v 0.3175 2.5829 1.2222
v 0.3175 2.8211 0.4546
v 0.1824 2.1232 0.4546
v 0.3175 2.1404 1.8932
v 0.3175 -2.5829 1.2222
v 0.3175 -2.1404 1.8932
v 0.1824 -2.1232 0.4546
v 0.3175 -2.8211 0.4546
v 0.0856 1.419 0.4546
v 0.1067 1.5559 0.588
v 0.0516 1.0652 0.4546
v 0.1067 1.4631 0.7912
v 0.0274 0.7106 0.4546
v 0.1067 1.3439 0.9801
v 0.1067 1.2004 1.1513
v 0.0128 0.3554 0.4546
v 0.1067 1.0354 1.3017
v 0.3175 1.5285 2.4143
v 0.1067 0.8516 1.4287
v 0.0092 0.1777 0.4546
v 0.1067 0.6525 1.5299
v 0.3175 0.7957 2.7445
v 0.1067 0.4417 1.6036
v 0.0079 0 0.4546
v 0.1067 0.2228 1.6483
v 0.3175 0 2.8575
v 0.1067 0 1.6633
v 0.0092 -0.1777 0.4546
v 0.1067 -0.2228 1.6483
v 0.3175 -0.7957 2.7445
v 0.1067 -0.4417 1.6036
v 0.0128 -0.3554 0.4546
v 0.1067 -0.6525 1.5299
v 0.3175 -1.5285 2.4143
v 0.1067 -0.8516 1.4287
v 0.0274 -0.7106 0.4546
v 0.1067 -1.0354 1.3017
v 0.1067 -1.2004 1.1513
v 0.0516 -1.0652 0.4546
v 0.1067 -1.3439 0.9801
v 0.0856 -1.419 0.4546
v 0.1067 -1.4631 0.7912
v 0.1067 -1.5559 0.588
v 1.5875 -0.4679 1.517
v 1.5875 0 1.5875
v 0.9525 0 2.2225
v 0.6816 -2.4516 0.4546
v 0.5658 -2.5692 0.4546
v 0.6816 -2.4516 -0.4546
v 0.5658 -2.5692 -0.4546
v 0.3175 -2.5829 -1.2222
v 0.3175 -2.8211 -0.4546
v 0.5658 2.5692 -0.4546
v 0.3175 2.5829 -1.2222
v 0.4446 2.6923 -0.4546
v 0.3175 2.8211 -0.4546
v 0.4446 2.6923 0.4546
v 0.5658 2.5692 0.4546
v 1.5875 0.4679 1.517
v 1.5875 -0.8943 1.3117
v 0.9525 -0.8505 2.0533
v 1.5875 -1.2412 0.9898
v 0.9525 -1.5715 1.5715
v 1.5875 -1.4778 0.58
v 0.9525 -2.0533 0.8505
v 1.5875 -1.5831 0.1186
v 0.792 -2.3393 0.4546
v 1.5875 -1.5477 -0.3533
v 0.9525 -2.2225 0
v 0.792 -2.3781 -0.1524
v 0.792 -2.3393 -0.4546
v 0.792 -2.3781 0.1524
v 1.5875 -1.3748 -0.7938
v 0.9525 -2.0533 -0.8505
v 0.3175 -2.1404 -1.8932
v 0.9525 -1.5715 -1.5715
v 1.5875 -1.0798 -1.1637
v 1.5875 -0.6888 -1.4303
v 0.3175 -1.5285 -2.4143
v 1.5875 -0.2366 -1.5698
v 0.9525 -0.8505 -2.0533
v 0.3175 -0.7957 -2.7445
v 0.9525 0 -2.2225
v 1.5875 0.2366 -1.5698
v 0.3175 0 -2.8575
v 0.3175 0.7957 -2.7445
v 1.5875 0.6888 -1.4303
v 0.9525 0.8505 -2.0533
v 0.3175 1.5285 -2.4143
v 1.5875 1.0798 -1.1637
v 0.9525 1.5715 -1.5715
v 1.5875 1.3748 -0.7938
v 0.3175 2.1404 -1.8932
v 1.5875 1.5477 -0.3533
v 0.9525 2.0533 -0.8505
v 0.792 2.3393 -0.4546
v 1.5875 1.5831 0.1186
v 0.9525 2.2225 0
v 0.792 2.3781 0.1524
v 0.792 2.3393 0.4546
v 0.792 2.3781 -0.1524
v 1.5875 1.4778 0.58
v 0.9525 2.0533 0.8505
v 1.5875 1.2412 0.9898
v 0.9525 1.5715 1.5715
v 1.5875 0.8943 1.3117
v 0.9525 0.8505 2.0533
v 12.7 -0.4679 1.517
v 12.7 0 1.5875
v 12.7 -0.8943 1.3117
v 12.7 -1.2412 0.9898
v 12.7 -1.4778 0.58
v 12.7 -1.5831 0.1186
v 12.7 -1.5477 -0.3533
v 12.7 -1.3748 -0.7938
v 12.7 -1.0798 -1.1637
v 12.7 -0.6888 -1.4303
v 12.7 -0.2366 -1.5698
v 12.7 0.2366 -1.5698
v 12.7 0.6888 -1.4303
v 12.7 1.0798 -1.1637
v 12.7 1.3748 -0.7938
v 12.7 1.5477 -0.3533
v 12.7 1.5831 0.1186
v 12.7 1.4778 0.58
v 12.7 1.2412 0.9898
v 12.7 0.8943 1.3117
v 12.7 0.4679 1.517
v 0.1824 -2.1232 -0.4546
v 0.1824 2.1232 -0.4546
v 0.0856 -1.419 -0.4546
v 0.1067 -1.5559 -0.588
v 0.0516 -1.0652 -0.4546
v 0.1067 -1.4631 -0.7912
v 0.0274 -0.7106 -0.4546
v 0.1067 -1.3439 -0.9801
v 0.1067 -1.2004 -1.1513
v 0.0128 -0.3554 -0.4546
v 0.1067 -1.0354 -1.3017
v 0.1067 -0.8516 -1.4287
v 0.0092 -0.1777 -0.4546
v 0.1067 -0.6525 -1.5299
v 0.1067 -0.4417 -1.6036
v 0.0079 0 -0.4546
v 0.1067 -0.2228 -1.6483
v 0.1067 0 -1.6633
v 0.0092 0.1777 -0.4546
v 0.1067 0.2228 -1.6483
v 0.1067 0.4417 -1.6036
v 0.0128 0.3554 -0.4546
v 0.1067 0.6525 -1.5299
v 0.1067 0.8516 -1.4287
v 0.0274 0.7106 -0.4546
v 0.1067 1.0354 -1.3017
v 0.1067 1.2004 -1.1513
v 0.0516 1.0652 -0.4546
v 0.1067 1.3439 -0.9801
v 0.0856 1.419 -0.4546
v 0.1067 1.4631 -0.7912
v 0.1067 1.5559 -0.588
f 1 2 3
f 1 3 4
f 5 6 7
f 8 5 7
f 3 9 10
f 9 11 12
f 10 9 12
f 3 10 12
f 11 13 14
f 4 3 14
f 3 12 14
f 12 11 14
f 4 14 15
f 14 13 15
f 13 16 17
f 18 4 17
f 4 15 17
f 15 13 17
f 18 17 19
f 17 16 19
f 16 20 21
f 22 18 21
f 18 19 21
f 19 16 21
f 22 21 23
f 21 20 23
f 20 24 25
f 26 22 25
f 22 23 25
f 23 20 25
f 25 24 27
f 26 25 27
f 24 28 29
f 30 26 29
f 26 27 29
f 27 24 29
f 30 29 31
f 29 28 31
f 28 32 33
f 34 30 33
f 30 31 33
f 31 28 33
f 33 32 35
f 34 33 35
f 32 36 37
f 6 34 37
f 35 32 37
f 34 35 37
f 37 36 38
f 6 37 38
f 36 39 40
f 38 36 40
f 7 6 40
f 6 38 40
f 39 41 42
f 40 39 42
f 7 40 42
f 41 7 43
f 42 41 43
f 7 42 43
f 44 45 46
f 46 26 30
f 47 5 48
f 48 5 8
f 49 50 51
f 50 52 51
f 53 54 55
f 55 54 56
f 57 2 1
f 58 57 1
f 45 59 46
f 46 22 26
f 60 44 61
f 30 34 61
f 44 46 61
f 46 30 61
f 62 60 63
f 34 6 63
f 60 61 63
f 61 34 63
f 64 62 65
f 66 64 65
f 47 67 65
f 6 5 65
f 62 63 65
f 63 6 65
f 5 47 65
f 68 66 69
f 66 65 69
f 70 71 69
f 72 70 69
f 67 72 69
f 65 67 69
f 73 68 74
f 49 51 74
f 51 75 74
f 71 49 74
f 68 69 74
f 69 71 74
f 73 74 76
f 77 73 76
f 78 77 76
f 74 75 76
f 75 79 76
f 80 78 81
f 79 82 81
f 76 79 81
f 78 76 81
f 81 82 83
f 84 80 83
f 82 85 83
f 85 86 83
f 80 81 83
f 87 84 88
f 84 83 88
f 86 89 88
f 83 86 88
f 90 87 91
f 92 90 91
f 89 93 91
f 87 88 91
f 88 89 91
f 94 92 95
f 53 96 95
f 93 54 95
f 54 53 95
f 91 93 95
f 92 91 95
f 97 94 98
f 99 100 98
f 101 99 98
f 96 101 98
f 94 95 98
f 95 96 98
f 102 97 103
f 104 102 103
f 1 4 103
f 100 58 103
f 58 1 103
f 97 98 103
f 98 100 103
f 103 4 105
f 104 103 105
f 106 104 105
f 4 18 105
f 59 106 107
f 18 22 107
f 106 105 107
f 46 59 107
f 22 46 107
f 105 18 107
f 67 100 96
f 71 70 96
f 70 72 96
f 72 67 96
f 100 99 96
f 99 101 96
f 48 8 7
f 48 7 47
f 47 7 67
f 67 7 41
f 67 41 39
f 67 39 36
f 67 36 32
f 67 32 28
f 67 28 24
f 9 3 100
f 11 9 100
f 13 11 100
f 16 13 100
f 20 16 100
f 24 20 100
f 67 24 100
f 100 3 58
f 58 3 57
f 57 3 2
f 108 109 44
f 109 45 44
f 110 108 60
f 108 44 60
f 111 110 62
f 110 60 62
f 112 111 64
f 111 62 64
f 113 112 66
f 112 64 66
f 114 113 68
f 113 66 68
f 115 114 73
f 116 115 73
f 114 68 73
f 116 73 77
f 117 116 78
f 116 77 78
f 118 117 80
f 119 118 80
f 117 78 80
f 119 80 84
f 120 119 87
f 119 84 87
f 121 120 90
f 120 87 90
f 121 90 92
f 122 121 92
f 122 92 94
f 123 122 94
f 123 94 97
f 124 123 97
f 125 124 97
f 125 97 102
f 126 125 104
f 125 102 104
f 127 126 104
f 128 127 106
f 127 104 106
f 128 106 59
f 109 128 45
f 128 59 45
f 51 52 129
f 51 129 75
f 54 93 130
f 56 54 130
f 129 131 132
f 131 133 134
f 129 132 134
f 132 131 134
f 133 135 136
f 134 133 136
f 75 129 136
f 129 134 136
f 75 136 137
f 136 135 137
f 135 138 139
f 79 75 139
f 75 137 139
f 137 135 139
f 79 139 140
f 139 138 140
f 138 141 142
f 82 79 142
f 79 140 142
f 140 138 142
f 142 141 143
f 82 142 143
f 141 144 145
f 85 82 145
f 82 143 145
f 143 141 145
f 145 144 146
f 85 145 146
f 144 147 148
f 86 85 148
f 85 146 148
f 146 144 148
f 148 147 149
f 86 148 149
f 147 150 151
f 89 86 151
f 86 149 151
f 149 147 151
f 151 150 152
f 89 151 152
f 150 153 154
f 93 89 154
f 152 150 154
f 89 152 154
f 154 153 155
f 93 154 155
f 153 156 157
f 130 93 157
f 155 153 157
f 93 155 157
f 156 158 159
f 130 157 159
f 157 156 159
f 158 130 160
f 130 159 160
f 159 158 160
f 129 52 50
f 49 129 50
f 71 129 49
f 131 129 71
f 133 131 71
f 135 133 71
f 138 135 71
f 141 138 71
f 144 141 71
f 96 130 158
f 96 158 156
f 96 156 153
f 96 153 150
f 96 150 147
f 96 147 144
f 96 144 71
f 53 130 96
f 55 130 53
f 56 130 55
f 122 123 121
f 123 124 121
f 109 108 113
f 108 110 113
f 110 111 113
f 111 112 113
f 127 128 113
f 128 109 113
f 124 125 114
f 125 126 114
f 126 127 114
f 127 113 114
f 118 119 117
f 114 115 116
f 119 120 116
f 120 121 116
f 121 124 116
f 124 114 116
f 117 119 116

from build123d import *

# Parameters (mm, degrees)
SKETCH2_W          = 1.583951874
SKETCH2_H          = 0.909262002
CUT_EXTRUDE1_DEPTH = 4.064


with BuildPart() as part:
    # Sketch1 → Revolve1 (revolve)
    with BuildSketch(Plane.XY, mode=Mode.PRIVATE) as revolve1_sk:
        with BuildLine():
            Line((0, 0), (12.7, 0))
            Line((12.7, 0), (12.7, 1.5875))
            Line((12.7, 1.5875), (1.5875, 1.5875))
            Line((1.5875, 1.5875), (0.3175, 2.8575))
            ThreePointArc((0.3175, 2.8575), (0.079618484, 1.437542391), (0, 0))
        make_face()
    revolve(revolve1_sk.sketch.rotate(Axis((0, 0, 0), (1, 0, 0)), 90), axis=Axis((0, 0, 0), (1, 0, 0)))

    # Sketch2 → Cut-Extrude1 (cut, symmetric)
    with BuildSketch(Plane(origin=(0, 0, 0), x_dir=(1, 0, 0), z_dir=(0, 1, 0))):
        Rectangle(SKETCH2_W, SKETCH2_H)
    extrude(amount=CUT_EXTRUDE1_DEPTH, both=True, mode=Mode.SUBTRACT)


solid = part.part
